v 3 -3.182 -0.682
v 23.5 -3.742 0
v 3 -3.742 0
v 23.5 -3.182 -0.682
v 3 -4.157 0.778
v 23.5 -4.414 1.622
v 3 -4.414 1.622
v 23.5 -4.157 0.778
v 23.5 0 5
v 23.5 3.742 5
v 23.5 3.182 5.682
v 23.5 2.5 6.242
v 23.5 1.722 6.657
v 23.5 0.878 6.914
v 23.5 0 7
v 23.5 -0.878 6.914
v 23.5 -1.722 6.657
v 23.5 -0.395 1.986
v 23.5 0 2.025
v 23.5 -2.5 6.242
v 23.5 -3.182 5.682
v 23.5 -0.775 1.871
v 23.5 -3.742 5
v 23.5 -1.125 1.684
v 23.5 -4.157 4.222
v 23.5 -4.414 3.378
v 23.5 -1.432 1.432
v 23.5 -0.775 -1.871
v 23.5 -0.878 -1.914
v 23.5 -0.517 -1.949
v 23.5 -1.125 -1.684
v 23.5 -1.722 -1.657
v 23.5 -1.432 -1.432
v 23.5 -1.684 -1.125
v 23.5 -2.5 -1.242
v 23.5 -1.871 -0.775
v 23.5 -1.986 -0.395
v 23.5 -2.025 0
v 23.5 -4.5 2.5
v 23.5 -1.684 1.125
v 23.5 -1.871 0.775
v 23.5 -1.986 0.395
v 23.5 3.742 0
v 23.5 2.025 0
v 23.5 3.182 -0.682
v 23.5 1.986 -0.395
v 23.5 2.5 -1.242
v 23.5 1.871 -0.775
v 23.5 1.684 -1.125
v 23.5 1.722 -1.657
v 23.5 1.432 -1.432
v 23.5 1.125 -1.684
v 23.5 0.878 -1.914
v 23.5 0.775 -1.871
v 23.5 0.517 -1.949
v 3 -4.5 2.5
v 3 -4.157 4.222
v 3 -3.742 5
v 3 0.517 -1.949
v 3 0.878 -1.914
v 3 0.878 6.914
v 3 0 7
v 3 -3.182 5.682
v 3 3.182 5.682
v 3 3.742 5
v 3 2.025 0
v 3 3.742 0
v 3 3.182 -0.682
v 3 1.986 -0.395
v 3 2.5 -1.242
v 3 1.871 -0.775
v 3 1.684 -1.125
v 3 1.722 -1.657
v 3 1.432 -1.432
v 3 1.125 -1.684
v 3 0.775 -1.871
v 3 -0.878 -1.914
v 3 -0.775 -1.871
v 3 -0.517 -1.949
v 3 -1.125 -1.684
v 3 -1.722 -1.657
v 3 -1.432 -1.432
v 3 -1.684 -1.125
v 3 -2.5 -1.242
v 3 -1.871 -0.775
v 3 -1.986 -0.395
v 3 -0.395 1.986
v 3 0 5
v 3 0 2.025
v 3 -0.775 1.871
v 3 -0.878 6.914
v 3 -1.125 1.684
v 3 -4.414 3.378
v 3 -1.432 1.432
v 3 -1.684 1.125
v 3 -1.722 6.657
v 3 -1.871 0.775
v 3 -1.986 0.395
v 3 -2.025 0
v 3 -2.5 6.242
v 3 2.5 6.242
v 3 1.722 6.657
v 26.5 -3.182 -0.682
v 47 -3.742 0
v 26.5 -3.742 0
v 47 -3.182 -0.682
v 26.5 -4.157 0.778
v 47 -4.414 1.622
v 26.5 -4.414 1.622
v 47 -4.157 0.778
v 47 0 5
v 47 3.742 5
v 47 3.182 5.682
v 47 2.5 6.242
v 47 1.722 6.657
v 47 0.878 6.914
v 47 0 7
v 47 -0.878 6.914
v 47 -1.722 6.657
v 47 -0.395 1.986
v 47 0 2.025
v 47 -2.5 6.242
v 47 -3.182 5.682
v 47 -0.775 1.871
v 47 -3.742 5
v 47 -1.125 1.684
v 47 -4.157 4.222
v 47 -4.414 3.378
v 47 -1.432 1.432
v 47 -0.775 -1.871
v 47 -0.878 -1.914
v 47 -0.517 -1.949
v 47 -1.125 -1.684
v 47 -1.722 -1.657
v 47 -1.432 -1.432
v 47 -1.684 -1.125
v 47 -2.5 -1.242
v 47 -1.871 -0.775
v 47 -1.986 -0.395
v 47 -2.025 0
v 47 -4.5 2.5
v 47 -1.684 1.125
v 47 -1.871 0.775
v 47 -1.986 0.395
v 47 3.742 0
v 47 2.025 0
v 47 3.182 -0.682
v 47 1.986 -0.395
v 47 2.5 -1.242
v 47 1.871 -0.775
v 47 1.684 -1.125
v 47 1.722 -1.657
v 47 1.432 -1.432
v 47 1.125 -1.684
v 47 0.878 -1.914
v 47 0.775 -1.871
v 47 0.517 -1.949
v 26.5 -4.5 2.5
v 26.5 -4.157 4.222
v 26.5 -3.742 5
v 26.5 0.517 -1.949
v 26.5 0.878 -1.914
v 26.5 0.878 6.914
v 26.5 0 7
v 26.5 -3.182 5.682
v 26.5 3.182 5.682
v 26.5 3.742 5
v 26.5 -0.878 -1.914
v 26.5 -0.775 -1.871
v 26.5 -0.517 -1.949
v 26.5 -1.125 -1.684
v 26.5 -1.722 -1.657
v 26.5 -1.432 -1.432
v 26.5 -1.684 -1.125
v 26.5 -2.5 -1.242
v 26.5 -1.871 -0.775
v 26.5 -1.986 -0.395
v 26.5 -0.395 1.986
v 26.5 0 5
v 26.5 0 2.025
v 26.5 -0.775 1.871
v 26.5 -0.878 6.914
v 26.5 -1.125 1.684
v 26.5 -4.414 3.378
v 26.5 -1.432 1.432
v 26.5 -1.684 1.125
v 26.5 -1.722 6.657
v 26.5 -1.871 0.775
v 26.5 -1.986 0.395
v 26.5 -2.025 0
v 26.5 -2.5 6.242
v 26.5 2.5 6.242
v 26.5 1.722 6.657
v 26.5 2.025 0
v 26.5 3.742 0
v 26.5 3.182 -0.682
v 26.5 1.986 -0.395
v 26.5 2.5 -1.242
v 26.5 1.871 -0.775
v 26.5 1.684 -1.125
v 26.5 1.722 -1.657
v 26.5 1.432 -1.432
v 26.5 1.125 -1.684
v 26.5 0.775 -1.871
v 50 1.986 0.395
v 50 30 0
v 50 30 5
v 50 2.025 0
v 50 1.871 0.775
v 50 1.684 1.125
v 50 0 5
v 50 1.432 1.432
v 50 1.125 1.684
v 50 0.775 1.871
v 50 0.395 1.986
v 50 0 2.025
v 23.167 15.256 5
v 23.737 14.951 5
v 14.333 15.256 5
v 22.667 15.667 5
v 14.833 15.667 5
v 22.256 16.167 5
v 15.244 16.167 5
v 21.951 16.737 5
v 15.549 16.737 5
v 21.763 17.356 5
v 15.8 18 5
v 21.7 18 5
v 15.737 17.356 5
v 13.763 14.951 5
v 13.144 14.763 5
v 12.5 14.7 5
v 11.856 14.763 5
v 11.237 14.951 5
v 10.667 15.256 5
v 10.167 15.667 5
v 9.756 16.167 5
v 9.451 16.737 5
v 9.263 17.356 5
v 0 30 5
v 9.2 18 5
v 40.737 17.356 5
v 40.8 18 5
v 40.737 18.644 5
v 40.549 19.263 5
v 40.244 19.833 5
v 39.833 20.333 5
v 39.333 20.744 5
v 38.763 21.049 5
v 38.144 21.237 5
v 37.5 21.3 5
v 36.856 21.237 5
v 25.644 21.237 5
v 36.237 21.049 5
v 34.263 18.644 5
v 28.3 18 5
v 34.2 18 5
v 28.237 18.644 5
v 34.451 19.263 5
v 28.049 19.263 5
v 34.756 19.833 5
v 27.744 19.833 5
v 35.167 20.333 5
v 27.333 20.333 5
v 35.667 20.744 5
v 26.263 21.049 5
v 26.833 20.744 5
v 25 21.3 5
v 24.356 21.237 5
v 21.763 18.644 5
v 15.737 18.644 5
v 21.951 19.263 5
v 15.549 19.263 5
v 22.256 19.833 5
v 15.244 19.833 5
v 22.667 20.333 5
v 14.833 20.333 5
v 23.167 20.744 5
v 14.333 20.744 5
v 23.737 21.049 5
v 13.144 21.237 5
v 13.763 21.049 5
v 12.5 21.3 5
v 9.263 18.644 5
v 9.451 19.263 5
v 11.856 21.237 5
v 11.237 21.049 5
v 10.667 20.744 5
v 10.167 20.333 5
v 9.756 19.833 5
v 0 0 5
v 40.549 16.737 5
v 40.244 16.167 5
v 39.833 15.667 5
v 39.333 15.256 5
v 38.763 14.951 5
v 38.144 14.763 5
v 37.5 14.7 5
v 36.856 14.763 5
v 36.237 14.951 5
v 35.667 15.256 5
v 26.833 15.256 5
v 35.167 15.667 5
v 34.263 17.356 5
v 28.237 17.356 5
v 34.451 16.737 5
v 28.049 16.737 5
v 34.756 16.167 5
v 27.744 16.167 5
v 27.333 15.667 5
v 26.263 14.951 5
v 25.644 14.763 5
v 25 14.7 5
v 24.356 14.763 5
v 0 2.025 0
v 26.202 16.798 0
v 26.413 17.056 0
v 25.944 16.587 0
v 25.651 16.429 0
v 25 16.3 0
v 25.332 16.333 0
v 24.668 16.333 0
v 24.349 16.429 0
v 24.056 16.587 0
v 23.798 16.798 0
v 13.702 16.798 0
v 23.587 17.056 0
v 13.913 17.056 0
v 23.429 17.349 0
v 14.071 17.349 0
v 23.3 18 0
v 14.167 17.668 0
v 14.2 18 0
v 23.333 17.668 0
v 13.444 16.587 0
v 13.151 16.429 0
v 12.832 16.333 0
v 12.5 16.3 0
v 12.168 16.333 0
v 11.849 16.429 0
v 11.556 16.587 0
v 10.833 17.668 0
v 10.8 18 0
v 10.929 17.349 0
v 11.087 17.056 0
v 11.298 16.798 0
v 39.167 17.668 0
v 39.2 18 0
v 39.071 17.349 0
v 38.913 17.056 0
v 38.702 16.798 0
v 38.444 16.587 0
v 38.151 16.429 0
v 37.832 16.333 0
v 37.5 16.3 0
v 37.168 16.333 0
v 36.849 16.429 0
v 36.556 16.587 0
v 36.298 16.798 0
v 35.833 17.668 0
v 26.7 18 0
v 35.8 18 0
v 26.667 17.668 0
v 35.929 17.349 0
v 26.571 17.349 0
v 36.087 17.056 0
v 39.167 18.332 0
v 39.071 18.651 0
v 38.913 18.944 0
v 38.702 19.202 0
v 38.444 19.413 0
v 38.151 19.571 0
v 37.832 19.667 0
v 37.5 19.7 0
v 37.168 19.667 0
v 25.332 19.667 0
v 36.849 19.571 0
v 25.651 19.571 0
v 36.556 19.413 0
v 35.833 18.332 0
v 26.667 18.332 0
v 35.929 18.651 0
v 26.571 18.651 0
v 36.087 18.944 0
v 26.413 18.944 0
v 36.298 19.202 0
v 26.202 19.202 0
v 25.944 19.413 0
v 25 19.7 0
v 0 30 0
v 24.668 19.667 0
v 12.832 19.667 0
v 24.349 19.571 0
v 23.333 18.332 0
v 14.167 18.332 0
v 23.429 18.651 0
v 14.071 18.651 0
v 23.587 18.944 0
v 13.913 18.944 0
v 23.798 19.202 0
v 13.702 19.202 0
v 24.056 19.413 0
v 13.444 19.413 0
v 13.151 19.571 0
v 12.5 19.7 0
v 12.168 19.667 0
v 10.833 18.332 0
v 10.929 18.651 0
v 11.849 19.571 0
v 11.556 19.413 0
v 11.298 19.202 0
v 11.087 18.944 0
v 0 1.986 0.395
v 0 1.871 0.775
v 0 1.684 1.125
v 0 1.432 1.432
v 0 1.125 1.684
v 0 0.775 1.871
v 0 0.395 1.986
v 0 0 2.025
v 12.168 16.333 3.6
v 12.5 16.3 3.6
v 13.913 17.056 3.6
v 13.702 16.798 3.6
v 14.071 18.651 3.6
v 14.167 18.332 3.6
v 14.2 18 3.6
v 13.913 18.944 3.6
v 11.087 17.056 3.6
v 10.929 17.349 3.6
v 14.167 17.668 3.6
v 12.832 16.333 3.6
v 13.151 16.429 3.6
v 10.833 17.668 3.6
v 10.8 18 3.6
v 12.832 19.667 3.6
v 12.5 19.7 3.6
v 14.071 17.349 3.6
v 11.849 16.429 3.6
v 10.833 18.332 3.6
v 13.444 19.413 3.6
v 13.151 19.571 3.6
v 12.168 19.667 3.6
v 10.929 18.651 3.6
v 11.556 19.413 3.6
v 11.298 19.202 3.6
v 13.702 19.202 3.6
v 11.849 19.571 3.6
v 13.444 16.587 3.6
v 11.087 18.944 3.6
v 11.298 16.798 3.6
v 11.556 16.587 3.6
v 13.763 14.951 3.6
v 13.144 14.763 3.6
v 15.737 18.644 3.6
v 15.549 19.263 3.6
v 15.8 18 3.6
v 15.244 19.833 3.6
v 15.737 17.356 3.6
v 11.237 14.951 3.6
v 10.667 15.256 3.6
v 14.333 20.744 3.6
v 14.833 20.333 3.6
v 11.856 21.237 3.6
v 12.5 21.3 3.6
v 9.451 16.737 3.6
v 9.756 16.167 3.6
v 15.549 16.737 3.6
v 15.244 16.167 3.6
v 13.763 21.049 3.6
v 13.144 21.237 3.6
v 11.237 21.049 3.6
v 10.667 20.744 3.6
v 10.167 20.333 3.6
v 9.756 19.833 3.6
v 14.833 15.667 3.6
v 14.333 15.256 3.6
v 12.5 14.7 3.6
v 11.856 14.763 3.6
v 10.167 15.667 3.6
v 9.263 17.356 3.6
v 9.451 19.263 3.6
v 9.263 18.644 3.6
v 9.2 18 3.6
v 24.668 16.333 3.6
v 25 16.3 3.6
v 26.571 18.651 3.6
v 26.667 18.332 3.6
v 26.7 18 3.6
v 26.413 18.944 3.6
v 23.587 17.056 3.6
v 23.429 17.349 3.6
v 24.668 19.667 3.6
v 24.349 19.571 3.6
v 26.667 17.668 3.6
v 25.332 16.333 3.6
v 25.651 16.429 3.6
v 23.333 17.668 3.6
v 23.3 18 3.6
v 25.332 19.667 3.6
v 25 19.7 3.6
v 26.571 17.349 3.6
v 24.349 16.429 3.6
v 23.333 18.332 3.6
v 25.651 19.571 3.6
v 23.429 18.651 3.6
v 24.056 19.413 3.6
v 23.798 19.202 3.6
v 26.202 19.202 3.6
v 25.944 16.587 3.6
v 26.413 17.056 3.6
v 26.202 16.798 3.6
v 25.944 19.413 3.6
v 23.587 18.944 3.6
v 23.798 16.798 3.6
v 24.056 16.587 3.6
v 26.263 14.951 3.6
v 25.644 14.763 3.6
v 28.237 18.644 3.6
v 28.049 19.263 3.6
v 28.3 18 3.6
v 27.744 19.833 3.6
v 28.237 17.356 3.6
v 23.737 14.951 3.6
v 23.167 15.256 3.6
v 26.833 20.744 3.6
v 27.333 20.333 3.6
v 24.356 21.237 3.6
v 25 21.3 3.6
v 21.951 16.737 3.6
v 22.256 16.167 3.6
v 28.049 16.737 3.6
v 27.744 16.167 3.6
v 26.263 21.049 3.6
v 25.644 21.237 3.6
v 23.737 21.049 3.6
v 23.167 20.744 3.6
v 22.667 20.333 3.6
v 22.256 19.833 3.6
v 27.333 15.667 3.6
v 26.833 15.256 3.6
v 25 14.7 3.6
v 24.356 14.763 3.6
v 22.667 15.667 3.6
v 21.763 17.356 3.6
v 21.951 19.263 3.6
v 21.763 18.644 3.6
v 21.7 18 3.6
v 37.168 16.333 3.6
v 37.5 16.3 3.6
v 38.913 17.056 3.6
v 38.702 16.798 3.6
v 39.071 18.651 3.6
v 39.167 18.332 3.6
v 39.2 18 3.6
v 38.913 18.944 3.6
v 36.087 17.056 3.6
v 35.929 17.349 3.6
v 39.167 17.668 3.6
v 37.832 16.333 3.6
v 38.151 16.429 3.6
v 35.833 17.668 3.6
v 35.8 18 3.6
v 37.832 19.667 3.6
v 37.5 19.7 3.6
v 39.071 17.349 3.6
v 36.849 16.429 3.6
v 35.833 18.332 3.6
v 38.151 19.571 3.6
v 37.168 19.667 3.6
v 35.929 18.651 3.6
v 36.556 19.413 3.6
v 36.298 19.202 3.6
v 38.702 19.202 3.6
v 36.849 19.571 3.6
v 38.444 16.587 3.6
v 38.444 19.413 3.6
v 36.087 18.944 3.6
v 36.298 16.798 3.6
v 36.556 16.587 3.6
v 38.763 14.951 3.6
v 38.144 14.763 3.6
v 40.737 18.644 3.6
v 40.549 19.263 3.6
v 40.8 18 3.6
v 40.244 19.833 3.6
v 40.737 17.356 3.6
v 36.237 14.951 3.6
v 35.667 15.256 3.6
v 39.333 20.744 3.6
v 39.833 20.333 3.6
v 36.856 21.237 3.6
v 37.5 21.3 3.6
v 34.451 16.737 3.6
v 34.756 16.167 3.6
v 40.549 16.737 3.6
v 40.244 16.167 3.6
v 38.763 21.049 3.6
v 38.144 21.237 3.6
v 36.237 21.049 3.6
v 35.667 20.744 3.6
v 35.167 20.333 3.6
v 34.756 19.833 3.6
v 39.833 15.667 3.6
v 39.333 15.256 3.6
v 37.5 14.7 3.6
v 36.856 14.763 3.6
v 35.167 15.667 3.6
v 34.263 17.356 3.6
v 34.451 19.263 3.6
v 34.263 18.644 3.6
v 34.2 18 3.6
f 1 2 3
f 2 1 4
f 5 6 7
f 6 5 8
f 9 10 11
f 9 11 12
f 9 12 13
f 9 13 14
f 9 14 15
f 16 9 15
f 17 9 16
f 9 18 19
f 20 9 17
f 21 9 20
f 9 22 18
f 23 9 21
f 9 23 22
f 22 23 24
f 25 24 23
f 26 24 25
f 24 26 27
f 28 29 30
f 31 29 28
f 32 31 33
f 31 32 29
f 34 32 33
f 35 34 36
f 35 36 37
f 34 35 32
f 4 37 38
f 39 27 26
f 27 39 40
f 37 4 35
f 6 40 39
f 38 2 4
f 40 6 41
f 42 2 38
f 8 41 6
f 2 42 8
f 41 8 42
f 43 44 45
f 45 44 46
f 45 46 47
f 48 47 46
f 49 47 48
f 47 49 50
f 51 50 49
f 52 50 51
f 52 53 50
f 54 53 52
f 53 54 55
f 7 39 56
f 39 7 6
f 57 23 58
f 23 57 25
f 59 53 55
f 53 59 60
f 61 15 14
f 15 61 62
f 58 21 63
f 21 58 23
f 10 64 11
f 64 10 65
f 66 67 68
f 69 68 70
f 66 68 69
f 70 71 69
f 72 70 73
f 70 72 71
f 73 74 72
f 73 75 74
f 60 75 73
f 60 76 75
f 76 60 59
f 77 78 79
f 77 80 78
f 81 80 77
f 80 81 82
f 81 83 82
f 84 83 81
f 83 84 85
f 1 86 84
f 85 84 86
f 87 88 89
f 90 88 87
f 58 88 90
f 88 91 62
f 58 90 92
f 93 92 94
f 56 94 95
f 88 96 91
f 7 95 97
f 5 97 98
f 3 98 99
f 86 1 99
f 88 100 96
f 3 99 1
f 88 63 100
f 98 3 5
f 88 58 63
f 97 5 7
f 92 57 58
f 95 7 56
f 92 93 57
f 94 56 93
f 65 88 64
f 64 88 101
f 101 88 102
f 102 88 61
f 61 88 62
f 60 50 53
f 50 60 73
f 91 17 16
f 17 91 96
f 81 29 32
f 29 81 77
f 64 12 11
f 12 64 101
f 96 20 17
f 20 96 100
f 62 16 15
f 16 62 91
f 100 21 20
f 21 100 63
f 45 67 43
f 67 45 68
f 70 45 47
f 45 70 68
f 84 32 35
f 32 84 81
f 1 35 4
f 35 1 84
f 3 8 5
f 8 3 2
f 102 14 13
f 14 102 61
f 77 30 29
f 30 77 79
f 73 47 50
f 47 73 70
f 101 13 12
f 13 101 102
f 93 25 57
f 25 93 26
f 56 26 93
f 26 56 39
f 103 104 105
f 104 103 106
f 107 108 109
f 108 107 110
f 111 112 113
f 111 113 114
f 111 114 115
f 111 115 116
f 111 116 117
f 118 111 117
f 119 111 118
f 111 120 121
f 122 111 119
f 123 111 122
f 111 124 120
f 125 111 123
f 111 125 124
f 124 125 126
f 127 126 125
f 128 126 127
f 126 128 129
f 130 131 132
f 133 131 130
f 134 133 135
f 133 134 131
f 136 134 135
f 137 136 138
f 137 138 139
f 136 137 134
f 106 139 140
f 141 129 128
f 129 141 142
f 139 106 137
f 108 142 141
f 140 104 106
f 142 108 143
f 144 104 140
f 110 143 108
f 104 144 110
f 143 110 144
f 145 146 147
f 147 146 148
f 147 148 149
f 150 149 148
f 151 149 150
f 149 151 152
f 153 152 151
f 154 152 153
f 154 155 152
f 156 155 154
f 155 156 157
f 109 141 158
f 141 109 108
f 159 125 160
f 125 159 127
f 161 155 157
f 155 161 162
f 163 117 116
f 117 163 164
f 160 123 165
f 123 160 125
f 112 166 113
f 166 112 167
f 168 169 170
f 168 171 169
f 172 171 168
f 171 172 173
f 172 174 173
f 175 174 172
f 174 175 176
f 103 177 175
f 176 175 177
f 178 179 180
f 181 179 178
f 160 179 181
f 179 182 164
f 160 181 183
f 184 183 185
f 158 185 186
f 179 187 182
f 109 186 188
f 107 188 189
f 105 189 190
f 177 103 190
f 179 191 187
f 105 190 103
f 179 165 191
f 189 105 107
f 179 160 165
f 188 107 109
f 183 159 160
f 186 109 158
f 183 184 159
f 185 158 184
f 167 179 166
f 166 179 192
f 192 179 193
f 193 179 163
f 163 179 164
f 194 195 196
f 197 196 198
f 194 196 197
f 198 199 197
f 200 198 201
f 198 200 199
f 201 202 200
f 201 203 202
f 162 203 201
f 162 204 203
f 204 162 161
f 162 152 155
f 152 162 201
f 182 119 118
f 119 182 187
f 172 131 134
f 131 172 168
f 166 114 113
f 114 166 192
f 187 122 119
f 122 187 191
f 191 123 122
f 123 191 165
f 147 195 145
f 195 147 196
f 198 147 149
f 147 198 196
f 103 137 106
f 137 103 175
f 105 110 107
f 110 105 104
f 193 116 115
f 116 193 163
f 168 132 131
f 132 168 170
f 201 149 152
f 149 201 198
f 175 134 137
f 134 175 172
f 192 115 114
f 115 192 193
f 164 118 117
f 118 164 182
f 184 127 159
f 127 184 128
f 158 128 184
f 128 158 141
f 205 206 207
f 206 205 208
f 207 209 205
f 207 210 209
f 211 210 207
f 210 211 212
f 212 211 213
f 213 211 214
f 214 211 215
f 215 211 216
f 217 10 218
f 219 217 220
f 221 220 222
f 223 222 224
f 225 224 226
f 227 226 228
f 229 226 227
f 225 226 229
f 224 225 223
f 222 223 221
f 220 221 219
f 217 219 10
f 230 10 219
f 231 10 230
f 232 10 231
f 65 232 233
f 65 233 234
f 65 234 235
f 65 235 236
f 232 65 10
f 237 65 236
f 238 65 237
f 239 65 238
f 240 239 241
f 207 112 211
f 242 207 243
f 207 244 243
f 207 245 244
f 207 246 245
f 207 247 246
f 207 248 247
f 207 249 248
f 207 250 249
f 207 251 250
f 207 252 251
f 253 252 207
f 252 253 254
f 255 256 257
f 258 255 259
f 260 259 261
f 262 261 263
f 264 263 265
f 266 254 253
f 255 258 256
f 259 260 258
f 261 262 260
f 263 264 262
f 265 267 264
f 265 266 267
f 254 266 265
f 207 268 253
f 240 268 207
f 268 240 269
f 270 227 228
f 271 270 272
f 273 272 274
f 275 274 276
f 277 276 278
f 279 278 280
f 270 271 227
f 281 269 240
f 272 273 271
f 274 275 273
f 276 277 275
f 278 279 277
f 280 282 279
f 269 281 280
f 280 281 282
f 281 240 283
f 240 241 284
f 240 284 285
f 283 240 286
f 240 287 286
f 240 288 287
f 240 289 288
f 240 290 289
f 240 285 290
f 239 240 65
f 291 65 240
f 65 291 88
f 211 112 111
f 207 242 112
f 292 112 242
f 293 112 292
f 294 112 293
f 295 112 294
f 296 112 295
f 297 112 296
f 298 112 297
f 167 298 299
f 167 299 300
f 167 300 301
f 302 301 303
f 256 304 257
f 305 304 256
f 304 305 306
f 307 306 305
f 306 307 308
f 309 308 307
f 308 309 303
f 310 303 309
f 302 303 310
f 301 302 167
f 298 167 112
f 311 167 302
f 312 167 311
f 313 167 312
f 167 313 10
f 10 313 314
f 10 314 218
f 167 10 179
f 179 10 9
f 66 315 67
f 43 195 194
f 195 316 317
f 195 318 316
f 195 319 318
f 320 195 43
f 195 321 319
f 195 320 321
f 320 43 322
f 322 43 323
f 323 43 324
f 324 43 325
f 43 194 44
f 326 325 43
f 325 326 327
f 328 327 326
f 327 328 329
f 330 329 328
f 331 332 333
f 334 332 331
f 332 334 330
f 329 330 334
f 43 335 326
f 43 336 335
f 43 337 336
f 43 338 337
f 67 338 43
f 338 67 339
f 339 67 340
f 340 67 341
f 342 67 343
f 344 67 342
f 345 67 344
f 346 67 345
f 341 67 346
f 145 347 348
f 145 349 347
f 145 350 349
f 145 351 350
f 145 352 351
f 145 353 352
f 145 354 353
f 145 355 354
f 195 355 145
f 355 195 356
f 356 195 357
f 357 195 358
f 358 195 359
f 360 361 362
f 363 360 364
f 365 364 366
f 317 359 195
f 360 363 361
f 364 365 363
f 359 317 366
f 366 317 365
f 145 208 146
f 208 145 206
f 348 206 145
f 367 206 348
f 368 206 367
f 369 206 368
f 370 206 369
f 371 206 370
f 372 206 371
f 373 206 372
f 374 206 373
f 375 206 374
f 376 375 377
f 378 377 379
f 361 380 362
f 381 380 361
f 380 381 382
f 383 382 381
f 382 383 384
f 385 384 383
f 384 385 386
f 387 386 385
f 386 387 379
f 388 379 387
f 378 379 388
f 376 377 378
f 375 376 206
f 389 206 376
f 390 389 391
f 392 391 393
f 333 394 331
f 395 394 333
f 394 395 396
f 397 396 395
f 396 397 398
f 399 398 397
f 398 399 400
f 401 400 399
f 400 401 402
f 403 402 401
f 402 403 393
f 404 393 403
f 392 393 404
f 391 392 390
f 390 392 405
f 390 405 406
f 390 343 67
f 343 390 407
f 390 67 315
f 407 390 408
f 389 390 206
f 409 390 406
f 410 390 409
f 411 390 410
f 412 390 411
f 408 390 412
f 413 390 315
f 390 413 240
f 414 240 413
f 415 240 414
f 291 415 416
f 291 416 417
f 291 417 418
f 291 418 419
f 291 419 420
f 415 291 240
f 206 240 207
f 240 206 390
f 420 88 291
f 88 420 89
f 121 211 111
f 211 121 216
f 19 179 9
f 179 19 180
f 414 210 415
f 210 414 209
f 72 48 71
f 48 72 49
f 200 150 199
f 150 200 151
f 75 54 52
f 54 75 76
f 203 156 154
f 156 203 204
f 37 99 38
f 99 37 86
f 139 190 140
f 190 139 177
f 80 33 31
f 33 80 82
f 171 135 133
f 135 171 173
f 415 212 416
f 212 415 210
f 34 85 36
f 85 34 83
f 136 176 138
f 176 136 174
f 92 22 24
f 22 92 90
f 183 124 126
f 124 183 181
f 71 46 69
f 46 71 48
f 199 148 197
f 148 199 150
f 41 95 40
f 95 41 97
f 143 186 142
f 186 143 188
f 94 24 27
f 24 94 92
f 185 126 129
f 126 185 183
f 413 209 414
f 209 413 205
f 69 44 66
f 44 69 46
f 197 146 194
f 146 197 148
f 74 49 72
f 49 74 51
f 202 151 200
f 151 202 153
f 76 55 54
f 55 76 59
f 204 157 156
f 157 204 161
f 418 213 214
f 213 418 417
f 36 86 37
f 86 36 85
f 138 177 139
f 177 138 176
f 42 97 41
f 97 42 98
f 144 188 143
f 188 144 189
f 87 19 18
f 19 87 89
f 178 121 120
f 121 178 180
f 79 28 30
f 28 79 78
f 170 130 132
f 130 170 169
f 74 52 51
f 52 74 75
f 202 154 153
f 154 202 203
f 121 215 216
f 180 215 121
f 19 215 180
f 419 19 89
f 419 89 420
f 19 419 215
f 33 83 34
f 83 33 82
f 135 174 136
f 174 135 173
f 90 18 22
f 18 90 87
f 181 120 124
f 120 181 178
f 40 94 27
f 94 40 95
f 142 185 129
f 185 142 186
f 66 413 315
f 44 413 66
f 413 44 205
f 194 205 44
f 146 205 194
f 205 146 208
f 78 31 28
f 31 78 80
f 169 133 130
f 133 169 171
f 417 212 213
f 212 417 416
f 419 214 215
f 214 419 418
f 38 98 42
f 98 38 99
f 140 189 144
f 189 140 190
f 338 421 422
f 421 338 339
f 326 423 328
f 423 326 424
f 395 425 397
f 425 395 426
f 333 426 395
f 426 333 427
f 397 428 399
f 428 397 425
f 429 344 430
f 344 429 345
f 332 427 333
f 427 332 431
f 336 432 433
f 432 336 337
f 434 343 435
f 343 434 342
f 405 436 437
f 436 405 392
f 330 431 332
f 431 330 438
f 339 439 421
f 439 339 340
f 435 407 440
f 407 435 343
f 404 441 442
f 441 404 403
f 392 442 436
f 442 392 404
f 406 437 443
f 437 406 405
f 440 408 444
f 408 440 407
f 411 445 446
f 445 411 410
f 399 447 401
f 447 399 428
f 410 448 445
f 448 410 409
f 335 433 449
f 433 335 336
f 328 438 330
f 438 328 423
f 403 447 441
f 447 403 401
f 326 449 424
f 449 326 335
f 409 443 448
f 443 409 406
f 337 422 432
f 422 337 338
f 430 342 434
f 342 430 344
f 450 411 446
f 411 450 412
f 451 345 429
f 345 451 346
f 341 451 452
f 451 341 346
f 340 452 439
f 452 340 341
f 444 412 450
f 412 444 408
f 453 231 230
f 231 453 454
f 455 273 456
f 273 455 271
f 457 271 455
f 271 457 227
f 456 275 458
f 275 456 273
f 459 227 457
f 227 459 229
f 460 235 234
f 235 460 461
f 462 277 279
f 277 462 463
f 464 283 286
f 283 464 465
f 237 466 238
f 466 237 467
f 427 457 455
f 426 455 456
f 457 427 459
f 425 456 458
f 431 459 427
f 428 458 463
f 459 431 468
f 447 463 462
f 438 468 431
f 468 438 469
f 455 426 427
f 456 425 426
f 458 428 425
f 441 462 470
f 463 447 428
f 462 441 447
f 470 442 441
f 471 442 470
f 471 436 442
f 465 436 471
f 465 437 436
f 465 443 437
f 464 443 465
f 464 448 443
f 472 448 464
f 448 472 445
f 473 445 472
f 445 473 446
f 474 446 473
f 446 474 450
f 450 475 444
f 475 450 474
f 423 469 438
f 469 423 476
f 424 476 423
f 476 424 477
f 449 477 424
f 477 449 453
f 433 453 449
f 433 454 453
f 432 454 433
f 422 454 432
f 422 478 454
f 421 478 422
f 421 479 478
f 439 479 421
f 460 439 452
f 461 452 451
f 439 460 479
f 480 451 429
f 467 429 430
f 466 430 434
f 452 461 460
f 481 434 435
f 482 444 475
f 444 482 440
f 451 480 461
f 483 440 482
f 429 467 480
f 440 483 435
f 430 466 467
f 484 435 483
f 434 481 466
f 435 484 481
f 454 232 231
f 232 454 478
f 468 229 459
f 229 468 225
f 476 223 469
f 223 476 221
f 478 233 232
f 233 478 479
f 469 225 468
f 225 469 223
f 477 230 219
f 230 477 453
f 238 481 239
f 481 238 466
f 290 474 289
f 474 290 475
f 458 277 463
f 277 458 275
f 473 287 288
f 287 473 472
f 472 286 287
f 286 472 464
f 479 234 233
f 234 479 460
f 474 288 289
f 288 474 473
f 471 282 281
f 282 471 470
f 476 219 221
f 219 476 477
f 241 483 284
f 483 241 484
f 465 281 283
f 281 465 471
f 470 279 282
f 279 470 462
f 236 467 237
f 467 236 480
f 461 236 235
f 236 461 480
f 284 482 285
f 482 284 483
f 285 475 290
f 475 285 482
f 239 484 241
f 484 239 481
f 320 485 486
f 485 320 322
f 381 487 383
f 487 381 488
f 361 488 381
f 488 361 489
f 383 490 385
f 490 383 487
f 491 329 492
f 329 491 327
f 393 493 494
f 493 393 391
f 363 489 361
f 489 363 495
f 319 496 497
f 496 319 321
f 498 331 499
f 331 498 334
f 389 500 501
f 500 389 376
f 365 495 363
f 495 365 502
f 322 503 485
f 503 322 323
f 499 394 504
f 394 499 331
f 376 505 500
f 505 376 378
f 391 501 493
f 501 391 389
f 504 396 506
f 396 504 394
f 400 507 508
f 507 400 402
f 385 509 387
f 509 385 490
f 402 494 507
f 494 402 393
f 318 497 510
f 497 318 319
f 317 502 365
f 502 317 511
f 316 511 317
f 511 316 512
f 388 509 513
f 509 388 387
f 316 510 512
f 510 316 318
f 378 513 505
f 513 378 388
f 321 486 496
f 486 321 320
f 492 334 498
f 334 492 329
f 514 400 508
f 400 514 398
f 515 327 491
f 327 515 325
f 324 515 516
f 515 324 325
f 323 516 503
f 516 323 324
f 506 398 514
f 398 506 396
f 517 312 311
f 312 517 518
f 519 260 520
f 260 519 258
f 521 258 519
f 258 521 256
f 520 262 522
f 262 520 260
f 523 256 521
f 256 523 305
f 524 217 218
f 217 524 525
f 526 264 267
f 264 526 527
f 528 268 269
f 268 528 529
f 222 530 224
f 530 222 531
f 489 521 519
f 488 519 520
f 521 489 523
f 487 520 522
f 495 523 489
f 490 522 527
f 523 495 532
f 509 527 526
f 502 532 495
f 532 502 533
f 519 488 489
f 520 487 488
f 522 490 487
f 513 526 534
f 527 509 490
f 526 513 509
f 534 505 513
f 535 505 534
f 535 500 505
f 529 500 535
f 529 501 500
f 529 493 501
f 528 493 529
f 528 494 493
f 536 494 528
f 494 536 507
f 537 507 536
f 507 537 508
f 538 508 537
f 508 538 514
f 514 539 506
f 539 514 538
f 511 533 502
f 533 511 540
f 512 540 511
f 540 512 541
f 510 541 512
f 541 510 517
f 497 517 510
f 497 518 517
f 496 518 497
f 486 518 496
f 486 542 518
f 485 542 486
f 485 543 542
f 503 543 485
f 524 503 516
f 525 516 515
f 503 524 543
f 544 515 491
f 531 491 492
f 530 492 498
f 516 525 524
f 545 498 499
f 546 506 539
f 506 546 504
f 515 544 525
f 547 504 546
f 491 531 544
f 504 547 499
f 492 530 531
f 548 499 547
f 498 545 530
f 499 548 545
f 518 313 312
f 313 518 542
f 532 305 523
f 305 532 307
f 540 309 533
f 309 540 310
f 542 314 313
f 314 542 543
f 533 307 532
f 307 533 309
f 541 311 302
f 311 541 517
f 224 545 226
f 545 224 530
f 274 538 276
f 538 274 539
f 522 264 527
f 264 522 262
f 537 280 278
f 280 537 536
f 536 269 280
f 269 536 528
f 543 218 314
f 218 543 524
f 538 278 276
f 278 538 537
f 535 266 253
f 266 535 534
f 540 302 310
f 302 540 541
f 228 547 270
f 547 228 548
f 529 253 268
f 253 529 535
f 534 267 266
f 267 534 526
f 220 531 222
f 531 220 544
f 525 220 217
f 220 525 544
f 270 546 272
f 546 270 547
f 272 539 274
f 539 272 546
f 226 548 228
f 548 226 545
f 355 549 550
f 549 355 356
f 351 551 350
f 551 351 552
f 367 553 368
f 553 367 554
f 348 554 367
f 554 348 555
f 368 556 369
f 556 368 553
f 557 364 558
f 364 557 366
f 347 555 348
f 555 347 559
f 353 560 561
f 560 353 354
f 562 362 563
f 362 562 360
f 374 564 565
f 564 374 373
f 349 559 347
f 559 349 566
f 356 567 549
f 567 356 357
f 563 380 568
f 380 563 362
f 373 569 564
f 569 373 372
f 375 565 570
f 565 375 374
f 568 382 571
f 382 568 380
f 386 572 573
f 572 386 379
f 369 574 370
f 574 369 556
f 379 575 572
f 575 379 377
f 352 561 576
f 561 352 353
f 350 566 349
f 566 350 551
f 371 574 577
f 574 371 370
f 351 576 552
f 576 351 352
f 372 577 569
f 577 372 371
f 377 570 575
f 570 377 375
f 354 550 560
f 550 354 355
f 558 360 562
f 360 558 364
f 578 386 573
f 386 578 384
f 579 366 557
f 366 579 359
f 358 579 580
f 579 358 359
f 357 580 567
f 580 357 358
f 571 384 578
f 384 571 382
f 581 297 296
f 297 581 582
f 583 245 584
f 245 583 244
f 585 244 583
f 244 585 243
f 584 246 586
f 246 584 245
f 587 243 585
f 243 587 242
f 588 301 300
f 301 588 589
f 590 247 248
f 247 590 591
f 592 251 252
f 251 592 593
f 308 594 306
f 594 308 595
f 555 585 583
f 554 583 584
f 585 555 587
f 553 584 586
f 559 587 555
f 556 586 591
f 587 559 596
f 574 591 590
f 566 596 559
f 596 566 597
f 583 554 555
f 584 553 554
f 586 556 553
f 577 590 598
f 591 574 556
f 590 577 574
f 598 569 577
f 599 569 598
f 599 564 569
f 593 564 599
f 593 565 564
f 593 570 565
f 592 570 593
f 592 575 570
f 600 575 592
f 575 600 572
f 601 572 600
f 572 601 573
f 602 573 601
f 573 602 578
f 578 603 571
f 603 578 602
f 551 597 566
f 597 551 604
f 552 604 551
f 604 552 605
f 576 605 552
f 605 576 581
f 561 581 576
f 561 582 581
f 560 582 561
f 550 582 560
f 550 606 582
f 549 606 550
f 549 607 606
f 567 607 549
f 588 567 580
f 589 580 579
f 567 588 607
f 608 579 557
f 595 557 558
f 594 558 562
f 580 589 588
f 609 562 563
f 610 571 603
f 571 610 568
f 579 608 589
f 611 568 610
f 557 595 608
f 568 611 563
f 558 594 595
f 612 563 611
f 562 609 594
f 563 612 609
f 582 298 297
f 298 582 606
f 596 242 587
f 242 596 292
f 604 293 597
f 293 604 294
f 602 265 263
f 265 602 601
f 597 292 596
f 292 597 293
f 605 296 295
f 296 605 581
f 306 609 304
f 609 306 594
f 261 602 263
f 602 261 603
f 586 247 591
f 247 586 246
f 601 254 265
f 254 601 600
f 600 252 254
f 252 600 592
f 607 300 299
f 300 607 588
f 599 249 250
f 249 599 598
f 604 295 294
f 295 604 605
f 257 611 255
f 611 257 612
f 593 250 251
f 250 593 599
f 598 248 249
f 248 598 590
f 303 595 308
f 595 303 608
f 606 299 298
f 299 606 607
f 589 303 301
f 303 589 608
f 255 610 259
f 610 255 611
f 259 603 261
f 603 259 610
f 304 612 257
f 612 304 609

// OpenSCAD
$fn = 32;

// ----------------------------------------------------------------------
// Hinge leaf: 50 x 34.5 x 9 mm
// ----------------------------------------------------------------------

// --- parameters (mm) ---
plate_len = 50;           // leaf length, X
plate_w = 30;             // leaf width, Y
plate_t = 5;              // leaf thickness
barrel_d = 9;             // knuckle diameter
barrel_w = 20.5;          // knuckle width
knuckle_n = 2;            // number of knuckles
pin_d = 4.05;             // pin bore
gap = 3;                  // gap between the knuckles
screw_d = 3.4;            // screw clearance
cs_d = 6.6;               // countersink diameter
cs_h = 1.4;               // countersink depth

module leaf() {
  cube([plate_len, plate_w, plate_t]);
}

module knuckles() {
  /* barrels sit on the leaf edge, the pin axis at half the leaf thickness */
  for (i = [0 : knuckle_n - 1])
    translate([gap + i * (barrel_w + gap), 0, plate_t * 0.5])
      rotate([0, 90, 0]) cylinder(h = barrel_w, d = barrel_d);
}

difference() {
  union() {
    leaf();
    knuckles();
  }
  rotate([0, 90, 0]) translate([0, 0, -1])
    cylinder(h = plate_len + 2, d = pin_d);
  translate([12.5, plate_w * 0.6, -1]) cylinder(h = plate_t + 2, d = screw_d);
  translate([12.5, plate_w * 0.6, plate_t - cs_h]) cylinder(h = cs_h + 0.5, d = cs_d);
  translate([25, plate_w * 0.6, -1]) cylinder(h = plate_t + 2, d = screw_d);
  translate([25, plate_w * 0.6, plate_t - cs_h]) cylinder(h = cs_h + 0.5, d = cs_d);
  translate([37.5, plate_w * 0.6, -1]) cylinder(h = plate_t + 2, d = screw_d);
  translate([37.5, plate_w * 0.6, plate_t - cs_h]) cylinder(h = cs_h + 0.5, d = cs_d);
}
